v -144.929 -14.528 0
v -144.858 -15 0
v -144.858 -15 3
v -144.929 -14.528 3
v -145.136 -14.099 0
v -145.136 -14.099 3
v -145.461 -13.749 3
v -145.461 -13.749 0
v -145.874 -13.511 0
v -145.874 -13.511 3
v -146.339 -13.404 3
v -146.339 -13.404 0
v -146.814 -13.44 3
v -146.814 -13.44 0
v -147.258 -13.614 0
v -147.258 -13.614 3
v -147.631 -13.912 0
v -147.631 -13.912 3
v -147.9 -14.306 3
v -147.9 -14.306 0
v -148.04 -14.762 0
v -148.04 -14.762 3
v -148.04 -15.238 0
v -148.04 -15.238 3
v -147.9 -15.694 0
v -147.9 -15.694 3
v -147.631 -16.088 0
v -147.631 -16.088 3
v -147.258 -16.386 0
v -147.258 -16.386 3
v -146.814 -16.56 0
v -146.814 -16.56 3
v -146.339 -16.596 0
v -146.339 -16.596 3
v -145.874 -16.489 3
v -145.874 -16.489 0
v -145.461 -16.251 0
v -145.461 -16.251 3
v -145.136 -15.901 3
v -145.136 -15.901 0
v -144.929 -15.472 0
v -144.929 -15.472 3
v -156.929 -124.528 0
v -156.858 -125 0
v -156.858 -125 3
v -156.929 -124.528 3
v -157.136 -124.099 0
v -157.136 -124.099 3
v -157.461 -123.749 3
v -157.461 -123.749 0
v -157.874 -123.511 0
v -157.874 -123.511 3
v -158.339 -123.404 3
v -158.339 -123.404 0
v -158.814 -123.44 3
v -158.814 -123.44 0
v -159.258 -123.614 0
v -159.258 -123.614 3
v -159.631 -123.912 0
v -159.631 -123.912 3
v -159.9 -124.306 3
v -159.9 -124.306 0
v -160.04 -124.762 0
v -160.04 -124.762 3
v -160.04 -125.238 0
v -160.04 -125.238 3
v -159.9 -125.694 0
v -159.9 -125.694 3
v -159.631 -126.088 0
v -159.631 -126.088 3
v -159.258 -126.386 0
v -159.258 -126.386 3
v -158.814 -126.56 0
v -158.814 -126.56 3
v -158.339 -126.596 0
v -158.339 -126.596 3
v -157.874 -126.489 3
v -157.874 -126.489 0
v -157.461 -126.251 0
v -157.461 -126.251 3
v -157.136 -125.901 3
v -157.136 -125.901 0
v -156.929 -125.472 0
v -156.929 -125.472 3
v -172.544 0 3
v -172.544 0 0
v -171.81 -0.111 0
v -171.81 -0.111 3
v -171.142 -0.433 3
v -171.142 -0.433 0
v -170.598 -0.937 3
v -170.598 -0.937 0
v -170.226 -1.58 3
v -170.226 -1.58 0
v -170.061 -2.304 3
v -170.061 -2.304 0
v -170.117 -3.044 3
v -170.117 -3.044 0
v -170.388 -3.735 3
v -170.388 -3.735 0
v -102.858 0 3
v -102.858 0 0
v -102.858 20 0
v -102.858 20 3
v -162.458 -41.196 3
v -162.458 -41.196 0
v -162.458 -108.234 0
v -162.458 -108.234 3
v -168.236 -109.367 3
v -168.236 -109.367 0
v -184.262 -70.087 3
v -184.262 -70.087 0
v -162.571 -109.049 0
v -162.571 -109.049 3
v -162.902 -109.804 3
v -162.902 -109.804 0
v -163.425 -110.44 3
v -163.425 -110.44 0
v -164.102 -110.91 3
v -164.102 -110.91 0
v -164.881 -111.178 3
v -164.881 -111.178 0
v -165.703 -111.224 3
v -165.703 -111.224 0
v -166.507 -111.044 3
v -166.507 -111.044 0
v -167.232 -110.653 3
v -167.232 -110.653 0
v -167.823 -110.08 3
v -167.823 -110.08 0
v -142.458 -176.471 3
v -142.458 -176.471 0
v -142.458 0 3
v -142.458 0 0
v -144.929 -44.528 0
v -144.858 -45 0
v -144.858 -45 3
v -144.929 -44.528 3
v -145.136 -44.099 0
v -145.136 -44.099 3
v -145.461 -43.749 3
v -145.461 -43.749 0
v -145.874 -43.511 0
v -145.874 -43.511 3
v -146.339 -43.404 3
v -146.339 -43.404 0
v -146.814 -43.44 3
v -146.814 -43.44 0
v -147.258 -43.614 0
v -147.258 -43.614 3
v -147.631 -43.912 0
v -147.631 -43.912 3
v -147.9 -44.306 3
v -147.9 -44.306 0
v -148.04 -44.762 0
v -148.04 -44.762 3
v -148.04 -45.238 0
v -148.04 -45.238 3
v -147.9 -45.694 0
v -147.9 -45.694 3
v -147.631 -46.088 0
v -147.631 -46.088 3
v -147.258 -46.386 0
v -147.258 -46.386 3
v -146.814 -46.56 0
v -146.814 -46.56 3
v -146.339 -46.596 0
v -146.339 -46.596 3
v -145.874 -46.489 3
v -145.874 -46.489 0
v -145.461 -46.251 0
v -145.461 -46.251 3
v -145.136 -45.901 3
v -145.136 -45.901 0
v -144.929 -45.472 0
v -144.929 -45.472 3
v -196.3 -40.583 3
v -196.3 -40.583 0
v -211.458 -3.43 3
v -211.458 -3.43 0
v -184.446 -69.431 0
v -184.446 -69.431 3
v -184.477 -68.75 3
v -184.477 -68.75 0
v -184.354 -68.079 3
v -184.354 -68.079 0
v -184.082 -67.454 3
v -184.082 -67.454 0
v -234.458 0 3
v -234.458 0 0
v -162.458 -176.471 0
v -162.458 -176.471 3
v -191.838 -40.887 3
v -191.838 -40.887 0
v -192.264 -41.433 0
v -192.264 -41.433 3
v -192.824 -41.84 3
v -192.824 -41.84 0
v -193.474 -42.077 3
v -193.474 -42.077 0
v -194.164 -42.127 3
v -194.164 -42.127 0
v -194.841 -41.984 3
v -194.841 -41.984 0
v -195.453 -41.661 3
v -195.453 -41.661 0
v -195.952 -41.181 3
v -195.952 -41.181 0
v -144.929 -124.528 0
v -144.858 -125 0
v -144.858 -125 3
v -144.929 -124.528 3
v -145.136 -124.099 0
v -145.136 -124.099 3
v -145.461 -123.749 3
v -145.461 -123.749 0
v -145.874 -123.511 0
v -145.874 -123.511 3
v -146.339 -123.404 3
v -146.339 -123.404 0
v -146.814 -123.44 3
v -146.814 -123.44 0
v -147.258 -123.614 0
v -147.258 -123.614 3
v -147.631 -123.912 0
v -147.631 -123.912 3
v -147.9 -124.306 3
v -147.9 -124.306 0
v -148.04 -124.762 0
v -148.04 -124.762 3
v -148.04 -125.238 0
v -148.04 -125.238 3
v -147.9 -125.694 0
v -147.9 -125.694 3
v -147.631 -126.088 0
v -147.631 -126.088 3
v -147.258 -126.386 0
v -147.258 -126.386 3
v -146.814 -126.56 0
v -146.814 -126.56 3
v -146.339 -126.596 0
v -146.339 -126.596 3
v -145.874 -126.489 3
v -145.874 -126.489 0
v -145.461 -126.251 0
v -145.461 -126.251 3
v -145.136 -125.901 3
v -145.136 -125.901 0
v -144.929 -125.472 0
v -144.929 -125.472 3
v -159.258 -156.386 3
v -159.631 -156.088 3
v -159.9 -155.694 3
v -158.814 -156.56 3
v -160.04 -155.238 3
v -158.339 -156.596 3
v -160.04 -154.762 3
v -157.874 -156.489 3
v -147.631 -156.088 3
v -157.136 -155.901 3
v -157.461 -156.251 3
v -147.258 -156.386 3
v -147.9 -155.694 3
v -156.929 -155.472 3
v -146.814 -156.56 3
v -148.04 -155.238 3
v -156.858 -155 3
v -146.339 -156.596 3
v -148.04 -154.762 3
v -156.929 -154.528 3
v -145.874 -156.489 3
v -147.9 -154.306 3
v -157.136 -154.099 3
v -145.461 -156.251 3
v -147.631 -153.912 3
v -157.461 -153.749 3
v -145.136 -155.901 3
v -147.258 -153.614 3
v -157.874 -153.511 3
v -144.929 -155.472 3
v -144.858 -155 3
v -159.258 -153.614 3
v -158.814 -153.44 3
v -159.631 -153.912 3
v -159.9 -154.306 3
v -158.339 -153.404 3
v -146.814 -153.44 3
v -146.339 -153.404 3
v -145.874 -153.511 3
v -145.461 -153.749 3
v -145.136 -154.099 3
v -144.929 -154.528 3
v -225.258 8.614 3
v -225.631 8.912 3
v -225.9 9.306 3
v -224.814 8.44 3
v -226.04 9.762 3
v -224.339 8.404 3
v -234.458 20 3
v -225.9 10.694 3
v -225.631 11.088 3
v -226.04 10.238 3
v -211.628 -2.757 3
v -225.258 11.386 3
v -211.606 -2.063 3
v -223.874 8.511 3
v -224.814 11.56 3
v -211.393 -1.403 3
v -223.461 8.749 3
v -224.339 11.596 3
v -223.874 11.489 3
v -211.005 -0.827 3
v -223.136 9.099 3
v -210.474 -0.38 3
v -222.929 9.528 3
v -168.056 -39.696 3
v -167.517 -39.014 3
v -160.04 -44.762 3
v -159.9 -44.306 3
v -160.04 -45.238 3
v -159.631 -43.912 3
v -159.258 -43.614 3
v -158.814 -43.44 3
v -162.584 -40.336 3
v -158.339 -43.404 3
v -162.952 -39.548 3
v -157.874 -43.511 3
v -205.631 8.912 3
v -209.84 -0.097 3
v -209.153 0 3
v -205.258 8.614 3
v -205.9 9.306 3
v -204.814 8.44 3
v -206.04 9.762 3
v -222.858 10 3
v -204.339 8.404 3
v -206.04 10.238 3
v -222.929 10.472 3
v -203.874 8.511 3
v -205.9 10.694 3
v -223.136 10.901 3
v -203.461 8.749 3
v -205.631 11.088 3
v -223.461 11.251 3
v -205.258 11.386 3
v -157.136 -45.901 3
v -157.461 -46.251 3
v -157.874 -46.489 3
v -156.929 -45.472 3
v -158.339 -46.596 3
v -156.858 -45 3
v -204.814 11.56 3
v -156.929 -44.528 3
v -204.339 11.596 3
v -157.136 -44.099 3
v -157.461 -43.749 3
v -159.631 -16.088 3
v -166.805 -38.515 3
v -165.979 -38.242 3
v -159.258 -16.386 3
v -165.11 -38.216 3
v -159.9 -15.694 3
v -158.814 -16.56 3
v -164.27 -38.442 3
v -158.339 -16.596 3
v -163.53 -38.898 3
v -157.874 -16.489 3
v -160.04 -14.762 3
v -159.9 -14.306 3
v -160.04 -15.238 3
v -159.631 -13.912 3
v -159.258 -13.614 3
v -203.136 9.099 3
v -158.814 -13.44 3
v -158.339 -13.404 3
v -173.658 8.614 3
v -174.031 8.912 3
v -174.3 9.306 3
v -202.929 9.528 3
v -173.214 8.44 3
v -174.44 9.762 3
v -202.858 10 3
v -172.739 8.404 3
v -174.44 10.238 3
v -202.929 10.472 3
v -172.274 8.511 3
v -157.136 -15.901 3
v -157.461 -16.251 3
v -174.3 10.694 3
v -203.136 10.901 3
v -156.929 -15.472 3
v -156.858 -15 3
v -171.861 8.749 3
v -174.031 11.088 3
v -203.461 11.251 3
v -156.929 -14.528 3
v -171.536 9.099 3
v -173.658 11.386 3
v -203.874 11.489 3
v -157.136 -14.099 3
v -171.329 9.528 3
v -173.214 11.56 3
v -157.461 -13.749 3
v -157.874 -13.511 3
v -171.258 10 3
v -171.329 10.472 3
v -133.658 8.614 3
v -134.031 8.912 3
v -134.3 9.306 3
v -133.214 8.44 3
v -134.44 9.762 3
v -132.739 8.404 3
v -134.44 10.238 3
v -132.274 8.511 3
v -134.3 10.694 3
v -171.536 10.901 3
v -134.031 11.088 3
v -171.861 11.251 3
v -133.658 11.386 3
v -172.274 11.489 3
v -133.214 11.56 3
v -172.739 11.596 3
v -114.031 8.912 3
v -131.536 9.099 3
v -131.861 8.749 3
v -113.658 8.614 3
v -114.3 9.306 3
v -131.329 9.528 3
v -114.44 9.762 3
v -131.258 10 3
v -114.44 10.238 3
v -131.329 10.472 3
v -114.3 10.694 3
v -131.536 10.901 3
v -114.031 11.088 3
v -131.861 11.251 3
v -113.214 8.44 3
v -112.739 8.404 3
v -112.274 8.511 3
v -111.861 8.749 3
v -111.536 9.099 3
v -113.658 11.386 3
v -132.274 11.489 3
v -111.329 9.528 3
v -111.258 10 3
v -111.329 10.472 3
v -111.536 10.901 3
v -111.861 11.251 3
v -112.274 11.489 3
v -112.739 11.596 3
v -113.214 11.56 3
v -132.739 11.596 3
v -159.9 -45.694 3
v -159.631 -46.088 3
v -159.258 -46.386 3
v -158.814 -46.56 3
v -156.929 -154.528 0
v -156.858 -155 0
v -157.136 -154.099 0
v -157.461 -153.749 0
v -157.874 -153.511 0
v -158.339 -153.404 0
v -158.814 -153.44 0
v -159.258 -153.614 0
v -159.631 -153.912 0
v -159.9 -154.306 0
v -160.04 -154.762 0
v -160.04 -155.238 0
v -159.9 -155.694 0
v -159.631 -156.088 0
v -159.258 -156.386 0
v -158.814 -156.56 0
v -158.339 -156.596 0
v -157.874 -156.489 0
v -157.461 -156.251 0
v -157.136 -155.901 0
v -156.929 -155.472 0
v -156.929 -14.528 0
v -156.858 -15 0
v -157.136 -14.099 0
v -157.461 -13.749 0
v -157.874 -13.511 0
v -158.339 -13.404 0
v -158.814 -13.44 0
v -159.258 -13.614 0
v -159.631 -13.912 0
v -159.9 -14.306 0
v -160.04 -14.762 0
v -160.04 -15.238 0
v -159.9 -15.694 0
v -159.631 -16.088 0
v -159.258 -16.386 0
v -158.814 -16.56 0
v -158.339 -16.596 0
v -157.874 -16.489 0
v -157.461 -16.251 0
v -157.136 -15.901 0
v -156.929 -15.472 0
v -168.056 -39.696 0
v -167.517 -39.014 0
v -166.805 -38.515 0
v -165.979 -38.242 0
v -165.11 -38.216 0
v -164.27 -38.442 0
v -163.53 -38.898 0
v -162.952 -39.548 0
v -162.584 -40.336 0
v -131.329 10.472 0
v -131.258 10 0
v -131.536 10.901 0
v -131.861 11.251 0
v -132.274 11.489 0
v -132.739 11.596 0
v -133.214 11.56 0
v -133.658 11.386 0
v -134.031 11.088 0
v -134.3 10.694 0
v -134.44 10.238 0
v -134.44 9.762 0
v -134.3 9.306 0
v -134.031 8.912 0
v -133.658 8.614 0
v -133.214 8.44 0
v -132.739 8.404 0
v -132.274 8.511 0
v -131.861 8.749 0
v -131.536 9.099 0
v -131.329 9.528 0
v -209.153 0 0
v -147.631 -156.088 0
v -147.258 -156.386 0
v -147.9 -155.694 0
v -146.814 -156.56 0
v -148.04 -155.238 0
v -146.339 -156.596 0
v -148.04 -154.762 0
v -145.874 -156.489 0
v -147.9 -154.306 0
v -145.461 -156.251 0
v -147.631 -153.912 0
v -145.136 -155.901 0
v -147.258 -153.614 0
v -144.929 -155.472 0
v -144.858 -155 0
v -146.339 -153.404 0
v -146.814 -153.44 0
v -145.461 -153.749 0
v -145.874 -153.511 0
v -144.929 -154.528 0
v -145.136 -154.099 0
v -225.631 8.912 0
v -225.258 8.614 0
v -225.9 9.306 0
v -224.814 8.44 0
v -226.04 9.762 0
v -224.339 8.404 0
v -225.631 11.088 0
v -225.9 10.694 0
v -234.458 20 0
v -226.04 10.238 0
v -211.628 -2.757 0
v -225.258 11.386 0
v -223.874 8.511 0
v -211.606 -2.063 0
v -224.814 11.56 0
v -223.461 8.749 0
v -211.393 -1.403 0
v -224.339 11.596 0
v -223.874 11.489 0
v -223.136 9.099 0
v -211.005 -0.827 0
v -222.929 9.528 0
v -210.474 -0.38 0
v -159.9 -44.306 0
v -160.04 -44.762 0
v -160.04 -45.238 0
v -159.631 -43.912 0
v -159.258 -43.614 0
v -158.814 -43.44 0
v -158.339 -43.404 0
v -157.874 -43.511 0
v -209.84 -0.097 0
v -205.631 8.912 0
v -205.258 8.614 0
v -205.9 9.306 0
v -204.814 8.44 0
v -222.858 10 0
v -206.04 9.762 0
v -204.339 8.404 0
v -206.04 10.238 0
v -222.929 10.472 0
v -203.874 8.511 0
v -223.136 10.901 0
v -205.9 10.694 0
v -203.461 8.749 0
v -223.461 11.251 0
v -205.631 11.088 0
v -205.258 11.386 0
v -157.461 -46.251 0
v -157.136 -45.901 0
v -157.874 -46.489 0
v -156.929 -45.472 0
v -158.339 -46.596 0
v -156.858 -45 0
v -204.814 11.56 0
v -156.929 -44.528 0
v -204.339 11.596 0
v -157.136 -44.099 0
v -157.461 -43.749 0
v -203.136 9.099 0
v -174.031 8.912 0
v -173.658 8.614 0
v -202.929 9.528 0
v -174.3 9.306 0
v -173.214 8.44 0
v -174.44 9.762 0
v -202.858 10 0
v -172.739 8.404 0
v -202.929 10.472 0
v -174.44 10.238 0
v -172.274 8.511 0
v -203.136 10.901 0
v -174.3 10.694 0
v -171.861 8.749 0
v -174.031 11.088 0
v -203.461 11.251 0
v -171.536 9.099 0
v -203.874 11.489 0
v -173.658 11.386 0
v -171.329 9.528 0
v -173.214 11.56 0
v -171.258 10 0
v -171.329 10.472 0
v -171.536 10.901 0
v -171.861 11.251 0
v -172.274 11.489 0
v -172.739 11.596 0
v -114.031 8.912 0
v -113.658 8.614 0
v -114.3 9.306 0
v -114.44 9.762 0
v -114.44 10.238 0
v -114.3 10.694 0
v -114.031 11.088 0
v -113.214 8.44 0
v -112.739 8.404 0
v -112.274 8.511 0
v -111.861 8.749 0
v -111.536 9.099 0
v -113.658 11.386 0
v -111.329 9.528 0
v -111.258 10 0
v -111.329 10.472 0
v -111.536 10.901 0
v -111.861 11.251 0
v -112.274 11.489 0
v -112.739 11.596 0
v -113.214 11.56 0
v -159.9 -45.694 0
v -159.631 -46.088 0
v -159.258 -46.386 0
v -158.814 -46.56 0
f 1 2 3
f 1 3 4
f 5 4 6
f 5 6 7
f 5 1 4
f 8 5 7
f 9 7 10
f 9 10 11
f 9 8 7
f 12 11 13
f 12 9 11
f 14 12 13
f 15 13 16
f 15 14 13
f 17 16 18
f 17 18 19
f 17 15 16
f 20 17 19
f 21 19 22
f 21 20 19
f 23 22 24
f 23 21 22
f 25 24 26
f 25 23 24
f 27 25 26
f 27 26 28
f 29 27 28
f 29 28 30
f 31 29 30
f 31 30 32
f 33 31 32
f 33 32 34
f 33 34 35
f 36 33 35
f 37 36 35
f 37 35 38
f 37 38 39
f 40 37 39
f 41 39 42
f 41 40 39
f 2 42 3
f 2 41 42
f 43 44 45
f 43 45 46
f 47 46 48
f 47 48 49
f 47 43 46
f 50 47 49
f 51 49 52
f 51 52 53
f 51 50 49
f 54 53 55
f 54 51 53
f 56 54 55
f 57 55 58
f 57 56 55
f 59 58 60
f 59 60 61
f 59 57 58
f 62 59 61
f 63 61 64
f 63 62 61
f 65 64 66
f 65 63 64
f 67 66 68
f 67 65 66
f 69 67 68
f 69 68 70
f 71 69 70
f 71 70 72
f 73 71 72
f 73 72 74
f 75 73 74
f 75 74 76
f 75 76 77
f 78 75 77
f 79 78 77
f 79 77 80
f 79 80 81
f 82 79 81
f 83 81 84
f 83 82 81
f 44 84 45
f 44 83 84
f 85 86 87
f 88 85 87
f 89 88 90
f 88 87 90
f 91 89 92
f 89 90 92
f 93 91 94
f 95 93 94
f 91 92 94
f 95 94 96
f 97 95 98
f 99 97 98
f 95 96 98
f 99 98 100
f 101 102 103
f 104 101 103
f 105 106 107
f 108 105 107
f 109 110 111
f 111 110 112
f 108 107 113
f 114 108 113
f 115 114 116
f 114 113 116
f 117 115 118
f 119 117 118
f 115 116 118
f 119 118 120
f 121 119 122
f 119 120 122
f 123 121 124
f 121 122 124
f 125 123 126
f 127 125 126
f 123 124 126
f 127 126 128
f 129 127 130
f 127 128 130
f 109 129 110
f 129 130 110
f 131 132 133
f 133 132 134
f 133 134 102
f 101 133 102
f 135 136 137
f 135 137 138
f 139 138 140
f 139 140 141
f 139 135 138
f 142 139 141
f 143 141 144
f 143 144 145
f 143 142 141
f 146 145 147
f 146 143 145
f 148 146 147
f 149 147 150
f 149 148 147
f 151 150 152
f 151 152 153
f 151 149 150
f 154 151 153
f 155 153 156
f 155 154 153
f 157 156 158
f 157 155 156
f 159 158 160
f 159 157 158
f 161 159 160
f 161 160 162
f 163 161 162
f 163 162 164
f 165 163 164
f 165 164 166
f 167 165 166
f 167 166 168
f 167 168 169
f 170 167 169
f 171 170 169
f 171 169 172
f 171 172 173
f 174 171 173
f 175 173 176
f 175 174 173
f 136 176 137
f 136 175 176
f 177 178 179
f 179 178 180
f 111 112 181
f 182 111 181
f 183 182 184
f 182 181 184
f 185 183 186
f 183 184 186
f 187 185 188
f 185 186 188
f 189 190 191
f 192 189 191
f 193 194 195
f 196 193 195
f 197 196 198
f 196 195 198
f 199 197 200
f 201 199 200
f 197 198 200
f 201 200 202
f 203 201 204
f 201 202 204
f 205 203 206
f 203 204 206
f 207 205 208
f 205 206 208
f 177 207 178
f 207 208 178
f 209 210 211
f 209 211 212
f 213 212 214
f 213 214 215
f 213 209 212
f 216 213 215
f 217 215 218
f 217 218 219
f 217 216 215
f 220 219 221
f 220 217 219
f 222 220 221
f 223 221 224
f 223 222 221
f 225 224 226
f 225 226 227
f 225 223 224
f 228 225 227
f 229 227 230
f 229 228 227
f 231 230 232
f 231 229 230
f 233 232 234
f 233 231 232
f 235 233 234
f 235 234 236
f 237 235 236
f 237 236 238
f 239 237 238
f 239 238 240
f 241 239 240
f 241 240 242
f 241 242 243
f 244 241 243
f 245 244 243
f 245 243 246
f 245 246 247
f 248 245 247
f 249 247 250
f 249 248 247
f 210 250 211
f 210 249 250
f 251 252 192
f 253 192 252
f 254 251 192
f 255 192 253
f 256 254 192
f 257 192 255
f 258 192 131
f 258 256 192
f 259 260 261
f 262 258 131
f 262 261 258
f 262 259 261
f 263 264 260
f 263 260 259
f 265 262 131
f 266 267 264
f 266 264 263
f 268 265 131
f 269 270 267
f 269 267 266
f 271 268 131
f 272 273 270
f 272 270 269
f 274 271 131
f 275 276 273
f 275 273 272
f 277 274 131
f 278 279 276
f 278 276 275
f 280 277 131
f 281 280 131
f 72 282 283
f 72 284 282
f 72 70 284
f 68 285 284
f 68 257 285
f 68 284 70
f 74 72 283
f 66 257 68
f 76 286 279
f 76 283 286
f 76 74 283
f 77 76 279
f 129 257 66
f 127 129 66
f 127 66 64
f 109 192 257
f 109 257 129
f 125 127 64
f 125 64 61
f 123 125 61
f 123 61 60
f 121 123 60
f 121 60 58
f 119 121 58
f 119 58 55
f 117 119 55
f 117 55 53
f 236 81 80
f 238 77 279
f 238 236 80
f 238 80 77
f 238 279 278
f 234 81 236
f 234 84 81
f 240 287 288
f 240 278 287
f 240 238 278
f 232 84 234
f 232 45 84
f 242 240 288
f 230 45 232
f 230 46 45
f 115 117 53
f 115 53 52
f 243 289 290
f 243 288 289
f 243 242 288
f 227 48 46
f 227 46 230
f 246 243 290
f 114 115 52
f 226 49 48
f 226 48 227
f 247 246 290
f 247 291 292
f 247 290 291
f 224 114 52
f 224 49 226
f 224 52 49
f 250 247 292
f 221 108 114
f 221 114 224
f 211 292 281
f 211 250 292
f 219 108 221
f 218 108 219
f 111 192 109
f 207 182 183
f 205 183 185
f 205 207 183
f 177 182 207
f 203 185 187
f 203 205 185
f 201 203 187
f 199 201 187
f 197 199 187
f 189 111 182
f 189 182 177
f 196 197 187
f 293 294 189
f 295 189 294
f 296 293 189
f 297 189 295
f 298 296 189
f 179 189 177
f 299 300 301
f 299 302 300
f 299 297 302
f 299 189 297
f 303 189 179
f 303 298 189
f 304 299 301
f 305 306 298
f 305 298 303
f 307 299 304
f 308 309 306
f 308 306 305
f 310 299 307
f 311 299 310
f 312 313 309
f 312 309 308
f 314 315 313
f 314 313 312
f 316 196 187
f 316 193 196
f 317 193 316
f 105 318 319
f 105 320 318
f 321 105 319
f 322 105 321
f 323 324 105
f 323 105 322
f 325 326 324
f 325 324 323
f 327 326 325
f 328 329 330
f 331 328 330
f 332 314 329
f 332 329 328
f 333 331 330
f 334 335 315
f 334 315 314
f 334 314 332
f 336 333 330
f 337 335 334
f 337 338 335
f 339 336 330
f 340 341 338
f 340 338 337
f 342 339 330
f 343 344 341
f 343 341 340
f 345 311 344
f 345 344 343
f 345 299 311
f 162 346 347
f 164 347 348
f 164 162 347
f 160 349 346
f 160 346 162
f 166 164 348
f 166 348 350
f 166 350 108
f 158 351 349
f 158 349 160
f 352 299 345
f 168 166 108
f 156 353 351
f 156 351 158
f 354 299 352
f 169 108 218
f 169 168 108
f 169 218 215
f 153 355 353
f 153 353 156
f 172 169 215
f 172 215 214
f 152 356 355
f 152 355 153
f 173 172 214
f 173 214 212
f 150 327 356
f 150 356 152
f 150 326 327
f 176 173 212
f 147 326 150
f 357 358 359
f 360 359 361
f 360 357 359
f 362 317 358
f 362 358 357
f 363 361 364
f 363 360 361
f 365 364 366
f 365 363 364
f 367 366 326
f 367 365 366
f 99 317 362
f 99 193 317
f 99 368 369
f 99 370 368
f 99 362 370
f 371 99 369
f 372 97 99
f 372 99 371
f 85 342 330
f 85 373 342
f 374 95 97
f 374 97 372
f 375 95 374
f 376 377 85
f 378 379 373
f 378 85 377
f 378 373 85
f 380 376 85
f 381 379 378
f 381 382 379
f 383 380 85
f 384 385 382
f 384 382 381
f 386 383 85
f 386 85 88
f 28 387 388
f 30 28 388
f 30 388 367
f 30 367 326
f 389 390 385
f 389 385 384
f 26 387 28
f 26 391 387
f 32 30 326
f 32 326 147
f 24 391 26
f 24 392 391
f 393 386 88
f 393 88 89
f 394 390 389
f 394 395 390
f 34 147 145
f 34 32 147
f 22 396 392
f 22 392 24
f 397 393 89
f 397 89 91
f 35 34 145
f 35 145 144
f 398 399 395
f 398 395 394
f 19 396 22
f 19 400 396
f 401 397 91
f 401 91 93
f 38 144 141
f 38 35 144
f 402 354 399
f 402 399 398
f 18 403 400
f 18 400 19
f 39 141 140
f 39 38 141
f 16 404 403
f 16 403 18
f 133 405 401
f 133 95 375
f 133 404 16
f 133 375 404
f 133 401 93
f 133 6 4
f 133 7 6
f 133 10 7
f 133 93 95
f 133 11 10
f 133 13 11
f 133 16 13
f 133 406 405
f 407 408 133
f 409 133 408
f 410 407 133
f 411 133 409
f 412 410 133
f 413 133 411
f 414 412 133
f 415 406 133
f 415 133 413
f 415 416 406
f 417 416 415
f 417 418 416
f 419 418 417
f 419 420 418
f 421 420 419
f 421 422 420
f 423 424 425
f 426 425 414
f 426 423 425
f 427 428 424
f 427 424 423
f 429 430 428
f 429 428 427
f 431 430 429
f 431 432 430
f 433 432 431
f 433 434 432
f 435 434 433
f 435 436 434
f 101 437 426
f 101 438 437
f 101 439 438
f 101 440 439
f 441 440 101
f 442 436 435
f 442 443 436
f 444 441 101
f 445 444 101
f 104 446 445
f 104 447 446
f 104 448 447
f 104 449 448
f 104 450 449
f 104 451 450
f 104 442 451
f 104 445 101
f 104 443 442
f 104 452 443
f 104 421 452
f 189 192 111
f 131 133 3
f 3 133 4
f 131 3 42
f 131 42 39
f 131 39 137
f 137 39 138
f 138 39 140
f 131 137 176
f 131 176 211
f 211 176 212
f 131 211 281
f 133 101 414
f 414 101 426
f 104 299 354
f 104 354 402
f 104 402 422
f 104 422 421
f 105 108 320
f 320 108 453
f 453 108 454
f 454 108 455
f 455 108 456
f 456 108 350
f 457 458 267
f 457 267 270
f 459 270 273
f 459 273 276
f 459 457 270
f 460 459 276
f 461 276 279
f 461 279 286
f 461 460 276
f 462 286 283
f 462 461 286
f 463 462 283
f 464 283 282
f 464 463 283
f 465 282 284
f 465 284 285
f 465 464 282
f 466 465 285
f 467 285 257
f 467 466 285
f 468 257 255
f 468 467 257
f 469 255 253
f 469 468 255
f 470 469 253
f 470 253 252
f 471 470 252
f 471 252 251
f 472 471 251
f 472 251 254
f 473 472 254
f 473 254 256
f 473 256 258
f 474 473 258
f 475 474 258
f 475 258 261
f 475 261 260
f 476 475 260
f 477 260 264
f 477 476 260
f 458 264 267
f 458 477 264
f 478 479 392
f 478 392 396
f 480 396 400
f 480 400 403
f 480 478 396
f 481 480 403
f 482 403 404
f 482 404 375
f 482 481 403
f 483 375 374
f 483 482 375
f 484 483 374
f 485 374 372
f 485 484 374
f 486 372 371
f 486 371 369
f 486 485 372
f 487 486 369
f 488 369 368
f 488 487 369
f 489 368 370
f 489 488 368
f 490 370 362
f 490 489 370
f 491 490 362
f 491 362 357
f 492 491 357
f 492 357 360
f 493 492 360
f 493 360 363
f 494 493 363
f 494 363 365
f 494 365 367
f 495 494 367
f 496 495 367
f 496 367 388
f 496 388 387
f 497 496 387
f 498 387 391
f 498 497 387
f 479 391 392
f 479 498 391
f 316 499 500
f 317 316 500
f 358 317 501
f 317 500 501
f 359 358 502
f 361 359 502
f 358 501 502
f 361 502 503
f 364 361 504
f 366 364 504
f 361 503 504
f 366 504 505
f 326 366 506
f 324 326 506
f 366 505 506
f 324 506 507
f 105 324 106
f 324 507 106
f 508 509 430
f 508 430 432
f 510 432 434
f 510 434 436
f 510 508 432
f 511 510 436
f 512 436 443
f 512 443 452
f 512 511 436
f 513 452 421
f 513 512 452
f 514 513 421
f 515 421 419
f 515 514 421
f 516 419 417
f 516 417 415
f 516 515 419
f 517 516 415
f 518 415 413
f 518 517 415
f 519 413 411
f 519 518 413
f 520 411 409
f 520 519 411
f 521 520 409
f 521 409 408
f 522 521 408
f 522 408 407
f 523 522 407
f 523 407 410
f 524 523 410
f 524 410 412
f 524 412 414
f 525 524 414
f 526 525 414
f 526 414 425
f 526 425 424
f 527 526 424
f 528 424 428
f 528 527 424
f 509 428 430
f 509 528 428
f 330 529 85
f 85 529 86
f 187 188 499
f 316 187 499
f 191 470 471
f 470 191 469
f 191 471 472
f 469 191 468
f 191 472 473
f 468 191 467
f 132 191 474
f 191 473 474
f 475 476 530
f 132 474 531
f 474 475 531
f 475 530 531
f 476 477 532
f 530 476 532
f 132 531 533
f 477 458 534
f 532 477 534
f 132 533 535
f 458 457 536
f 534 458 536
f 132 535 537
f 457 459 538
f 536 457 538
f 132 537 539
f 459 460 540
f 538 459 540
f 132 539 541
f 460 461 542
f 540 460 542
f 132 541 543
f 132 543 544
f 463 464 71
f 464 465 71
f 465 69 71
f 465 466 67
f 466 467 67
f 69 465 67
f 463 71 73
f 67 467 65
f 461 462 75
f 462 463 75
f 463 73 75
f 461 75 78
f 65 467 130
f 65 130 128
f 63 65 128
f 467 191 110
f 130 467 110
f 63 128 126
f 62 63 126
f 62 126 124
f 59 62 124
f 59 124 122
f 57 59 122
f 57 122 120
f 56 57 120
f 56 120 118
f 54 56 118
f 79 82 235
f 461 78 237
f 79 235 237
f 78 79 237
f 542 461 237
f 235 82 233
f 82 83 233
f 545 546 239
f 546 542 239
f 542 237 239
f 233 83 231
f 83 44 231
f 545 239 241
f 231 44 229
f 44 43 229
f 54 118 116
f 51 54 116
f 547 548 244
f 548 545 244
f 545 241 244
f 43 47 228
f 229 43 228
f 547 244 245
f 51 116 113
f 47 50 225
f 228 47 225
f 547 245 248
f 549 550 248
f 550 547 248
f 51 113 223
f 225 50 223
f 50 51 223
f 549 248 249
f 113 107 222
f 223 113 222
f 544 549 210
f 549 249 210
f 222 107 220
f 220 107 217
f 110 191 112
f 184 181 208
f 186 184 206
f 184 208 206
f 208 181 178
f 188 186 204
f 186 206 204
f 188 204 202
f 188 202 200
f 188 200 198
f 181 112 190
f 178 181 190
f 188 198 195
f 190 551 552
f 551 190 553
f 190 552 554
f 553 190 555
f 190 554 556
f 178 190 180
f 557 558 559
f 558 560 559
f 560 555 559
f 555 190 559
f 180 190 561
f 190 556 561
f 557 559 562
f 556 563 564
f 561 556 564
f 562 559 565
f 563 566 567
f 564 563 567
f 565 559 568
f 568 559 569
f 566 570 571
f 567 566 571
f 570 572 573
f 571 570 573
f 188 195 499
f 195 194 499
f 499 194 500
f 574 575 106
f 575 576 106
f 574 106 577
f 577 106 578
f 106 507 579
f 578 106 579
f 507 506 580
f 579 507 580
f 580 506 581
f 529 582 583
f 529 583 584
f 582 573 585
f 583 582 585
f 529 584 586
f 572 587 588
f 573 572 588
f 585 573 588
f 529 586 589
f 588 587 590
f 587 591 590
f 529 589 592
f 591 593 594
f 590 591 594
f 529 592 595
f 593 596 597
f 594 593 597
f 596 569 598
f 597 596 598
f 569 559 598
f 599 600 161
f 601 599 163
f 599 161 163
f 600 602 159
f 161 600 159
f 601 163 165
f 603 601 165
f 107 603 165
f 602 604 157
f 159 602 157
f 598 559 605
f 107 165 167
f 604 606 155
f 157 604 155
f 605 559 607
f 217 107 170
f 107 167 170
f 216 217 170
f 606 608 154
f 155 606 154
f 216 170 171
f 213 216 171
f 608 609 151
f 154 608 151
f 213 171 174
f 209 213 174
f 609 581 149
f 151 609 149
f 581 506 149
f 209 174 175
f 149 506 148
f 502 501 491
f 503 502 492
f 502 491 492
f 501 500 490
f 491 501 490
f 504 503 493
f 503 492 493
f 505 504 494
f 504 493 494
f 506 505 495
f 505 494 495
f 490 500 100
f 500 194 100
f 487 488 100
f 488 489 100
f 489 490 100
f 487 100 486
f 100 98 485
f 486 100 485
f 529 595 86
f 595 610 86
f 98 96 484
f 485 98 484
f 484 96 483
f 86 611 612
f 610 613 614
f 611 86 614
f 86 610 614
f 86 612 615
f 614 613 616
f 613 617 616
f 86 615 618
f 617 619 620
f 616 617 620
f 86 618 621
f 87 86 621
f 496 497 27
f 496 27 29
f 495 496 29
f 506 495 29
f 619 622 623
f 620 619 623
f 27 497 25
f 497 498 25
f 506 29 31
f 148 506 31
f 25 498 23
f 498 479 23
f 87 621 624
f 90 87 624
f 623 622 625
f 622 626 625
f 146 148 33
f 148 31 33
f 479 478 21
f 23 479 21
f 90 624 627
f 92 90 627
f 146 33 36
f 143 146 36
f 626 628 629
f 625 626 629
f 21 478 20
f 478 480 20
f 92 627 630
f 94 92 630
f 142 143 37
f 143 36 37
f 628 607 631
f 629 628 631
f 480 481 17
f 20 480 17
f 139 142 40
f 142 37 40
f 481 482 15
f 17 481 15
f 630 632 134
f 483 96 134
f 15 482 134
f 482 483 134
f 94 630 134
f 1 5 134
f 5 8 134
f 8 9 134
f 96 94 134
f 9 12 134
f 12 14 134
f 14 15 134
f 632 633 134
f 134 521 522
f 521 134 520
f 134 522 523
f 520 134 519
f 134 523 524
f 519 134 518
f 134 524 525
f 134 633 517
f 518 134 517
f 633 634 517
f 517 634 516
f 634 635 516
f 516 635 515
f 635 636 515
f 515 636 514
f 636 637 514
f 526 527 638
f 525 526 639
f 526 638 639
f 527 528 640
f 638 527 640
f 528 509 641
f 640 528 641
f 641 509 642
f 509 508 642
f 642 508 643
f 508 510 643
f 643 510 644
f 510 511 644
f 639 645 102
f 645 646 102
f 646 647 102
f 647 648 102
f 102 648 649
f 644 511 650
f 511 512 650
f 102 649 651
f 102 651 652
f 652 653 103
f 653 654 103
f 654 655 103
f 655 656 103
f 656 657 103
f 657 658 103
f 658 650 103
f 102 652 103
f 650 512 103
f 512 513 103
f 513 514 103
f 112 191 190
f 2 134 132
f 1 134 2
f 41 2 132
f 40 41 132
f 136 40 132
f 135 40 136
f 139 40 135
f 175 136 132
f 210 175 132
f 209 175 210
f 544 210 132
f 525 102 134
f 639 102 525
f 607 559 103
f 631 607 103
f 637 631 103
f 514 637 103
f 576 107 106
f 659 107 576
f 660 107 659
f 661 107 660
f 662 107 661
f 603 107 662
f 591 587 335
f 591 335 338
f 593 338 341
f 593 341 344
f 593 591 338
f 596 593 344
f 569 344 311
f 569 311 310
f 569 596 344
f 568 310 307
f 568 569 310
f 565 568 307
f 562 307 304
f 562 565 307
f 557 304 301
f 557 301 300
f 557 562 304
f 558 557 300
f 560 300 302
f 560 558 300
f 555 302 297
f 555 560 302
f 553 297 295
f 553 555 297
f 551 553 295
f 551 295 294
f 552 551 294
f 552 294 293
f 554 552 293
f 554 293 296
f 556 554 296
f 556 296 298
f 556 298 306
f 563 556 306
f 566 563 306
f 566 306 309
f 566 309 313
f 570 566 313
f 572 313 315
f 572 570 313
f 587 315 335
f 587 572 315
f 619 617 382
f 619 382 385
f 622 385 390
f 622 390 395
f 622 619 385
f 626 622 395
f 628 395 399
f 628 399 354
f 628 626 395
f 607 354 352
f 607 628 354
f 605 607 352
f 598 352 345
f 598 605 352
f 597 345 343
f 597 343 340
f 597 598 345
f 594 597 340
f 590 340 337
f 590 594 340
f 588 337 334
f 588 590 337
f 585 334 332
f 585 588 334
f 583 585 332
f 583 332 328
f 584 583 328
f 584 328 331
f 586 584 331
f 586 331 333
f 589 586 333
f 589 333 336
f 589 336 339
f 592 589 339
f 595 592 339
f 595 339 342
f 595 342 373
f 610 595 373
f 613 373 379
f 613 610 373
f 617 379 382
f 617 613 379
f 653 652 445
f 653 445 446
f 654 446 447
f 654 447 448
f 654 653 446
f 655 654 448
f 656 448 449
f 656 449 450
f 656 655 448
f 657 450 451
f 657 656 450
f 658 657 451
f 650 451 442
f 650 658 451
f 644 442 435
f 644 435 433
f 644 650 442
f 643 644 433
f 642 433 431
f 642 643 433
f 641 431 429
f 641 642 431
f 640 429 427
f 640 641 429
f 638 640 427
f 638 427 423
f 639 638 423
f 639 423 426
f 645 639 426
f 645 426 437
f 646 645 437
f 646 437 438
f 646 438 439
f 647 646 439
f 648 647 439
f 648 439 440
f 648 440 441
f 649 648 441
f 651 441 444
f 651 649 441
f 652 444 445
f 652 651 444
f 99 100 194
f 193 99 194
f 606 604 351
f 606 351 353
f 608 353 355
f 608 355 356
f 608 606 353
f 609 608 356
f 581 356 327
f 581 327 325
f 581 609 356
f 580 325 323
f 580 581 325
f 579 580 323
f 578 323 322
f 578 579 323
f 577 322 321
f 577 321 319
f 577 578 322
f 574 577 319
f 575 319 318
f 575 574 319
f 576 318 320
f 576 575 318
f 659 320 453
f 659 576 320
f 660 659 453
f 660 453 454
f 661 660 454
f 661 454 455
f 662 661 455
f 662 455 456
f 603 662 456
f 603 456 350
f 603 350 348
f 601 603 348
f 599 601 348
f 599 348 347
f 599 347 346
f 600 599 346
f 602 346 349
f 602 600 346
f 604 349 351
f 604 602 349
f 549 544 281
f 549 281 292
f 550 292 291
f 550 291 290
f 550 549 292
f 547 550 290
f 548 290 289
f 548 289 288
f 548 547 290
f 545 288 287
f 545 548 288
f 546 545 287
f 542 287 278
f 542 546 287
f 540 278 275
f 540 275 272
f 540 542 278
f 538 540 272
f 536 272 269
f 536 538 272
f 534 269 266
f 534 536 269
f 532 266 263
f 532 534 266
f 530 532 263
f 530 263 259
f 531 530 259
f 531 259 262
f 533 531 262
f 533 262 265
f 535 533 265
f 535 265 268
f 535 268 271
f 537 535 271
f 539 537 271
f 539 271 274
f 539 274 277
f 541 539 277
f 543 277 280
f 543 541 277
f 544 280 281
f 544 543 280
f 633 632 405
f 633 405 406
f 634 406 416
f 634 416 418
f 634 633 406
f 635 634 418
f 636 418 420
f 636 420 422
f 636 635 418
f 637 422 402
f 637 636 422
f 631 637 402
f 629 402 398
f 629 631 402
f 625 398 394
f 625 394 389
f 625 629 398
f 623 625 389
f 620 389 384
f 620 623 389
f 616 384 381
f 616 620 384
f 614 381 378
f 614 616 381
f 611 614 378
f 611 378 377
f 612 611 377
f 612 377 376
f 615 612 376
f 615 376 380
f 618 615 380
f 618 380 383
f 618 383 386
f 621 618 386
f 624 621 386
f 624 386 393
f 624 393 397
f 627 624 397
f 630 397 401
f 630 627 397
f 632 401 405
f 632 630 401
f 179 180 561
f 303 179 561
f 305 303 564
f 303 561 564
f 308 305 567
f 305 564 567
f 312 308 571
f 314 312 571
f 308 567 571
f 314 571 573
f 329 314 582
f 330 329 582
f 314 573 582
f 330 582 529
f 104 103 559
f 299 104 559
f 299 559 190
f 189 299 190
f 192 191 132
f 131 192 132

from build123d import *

# Parameters (mm, degrees)
SKETCH1_R      = 1.6
EXTRUDE1_DEPTH = 3


with BuildPart() as part:
    # Sketch1 → Extrude1 (new body)
    with BuildSketch(Plane.XY):
        Polygon((-234.458183995, 0), (-162.458183995, -176.470588235), (-142.458183995, -176.470588235), (-142.458183995, 0), (-102.858183995, 0), (-102.858183995, 20), (-102.863553327, 20), (-234.458183995, 20), align=None)
        with Locations((-112.858183995, 10)):
            Circle(SKETCH1_R, mode=Mode.SUBTRACT)
        with Locations((-132.858183995, 10)):
            Circle(SKETCH1_R, mode=Mode.SUBTRACT)
        with Locations((-172.858183995, 10)):
            Circle(SKETCH1_R, mode=Mode.SUBTRACT)
        with Locations((-146.458183995, -45)):
            Circle(SKETCH1_R, mode=Mode.SUBTRACT)
        with Locations((-158.458183995, -45)):
            Circle(SKETCH1_R, mode=Mode.SUBTRACT)
        with Locations((-146.458183995, -15)):
            Circle(SKETCH1_R, mode=Mode.SUBTRACT)
        with Locations((-158.458183995, -15)):
            Circle(SKETCH1_R, mode=Mode.SUBTRACT)
        with Locations((-224.458183995, 10)):
            Circle(SKETCH1_R, mode=Mode.SUBTRACT)
        with Locations((-204.458183995, 10)):
            Circle(SKETCH1_R, mode=Mode.SUBTRACT)
        with Locations((-158.458183995, -125)):
            Circle(SKETCH1_R, mode=Mode.SUBTRACT)
        with Locations((-146.458183995, -125)):
            Circle(SKETCH1_R, mode=Mode.SUBTRACT)
        with Locations((-158.458183995, -155)):
            Circle(SKETCH1_R, mode=Mode.SUBTRACT)
        with Locations((-146.458183995, -155)):
            Circle(SKETCH1_R, mode=Mode.SUBTRACT)
        with BuildLine():
            Line((-209.152667208, 0), (-172.544179417, 0))
            ThreePointArc((-172.544179417, 0), (-170.387933052, -1.244909419), (-170.387933052, -3.734728258))
            Line((-170.387933052, -3.734728258), (-191.838092393, -40.887494067))
            ThreePointArc((-191.838092393, -40.887494067), (-194.163782936, -42.126631048), (-196.299663326, -40.583157071))
            Line((-196.299663326, -40.583157071), (-211.457991776, -3.430391262))
            ThreePointArc((-211.457991776, -3.430391262), (-211.219192406, -1.101052676), (-209.152667208, 0))
        make_face(mode=Mode.SUBTRACT)
        with BuildLine():
            Line((-162.458183995, -41.196152423), (-162.458183995, -108.233623843))
            ThreePointArc((-162.458183995, -108.233623843), (-164.880734742, -111.177524717), (-168.235885568, -109.366926085))
            Line((-168.235885568, -109.366926085), (-184.261936587, -70.087389274))
            ThreePointArc((-184.261936587, -70.087389274), (-184.477279763, -68.749922566), (-184.082311226, -67.454087032))
            Line((-184.082311226, -67.454087032), (-168.056260207, -39.696152423))
            ThreePointArc((-168.056260207, -39.696152423), (-164.68172686, -38.298374944), (-162.458183995, -41.196152423))
        make_face(mode=Mode.SUBTRACT)
    extrude(amount=EXTRUDE1_DEPTH)


solid = part.part
